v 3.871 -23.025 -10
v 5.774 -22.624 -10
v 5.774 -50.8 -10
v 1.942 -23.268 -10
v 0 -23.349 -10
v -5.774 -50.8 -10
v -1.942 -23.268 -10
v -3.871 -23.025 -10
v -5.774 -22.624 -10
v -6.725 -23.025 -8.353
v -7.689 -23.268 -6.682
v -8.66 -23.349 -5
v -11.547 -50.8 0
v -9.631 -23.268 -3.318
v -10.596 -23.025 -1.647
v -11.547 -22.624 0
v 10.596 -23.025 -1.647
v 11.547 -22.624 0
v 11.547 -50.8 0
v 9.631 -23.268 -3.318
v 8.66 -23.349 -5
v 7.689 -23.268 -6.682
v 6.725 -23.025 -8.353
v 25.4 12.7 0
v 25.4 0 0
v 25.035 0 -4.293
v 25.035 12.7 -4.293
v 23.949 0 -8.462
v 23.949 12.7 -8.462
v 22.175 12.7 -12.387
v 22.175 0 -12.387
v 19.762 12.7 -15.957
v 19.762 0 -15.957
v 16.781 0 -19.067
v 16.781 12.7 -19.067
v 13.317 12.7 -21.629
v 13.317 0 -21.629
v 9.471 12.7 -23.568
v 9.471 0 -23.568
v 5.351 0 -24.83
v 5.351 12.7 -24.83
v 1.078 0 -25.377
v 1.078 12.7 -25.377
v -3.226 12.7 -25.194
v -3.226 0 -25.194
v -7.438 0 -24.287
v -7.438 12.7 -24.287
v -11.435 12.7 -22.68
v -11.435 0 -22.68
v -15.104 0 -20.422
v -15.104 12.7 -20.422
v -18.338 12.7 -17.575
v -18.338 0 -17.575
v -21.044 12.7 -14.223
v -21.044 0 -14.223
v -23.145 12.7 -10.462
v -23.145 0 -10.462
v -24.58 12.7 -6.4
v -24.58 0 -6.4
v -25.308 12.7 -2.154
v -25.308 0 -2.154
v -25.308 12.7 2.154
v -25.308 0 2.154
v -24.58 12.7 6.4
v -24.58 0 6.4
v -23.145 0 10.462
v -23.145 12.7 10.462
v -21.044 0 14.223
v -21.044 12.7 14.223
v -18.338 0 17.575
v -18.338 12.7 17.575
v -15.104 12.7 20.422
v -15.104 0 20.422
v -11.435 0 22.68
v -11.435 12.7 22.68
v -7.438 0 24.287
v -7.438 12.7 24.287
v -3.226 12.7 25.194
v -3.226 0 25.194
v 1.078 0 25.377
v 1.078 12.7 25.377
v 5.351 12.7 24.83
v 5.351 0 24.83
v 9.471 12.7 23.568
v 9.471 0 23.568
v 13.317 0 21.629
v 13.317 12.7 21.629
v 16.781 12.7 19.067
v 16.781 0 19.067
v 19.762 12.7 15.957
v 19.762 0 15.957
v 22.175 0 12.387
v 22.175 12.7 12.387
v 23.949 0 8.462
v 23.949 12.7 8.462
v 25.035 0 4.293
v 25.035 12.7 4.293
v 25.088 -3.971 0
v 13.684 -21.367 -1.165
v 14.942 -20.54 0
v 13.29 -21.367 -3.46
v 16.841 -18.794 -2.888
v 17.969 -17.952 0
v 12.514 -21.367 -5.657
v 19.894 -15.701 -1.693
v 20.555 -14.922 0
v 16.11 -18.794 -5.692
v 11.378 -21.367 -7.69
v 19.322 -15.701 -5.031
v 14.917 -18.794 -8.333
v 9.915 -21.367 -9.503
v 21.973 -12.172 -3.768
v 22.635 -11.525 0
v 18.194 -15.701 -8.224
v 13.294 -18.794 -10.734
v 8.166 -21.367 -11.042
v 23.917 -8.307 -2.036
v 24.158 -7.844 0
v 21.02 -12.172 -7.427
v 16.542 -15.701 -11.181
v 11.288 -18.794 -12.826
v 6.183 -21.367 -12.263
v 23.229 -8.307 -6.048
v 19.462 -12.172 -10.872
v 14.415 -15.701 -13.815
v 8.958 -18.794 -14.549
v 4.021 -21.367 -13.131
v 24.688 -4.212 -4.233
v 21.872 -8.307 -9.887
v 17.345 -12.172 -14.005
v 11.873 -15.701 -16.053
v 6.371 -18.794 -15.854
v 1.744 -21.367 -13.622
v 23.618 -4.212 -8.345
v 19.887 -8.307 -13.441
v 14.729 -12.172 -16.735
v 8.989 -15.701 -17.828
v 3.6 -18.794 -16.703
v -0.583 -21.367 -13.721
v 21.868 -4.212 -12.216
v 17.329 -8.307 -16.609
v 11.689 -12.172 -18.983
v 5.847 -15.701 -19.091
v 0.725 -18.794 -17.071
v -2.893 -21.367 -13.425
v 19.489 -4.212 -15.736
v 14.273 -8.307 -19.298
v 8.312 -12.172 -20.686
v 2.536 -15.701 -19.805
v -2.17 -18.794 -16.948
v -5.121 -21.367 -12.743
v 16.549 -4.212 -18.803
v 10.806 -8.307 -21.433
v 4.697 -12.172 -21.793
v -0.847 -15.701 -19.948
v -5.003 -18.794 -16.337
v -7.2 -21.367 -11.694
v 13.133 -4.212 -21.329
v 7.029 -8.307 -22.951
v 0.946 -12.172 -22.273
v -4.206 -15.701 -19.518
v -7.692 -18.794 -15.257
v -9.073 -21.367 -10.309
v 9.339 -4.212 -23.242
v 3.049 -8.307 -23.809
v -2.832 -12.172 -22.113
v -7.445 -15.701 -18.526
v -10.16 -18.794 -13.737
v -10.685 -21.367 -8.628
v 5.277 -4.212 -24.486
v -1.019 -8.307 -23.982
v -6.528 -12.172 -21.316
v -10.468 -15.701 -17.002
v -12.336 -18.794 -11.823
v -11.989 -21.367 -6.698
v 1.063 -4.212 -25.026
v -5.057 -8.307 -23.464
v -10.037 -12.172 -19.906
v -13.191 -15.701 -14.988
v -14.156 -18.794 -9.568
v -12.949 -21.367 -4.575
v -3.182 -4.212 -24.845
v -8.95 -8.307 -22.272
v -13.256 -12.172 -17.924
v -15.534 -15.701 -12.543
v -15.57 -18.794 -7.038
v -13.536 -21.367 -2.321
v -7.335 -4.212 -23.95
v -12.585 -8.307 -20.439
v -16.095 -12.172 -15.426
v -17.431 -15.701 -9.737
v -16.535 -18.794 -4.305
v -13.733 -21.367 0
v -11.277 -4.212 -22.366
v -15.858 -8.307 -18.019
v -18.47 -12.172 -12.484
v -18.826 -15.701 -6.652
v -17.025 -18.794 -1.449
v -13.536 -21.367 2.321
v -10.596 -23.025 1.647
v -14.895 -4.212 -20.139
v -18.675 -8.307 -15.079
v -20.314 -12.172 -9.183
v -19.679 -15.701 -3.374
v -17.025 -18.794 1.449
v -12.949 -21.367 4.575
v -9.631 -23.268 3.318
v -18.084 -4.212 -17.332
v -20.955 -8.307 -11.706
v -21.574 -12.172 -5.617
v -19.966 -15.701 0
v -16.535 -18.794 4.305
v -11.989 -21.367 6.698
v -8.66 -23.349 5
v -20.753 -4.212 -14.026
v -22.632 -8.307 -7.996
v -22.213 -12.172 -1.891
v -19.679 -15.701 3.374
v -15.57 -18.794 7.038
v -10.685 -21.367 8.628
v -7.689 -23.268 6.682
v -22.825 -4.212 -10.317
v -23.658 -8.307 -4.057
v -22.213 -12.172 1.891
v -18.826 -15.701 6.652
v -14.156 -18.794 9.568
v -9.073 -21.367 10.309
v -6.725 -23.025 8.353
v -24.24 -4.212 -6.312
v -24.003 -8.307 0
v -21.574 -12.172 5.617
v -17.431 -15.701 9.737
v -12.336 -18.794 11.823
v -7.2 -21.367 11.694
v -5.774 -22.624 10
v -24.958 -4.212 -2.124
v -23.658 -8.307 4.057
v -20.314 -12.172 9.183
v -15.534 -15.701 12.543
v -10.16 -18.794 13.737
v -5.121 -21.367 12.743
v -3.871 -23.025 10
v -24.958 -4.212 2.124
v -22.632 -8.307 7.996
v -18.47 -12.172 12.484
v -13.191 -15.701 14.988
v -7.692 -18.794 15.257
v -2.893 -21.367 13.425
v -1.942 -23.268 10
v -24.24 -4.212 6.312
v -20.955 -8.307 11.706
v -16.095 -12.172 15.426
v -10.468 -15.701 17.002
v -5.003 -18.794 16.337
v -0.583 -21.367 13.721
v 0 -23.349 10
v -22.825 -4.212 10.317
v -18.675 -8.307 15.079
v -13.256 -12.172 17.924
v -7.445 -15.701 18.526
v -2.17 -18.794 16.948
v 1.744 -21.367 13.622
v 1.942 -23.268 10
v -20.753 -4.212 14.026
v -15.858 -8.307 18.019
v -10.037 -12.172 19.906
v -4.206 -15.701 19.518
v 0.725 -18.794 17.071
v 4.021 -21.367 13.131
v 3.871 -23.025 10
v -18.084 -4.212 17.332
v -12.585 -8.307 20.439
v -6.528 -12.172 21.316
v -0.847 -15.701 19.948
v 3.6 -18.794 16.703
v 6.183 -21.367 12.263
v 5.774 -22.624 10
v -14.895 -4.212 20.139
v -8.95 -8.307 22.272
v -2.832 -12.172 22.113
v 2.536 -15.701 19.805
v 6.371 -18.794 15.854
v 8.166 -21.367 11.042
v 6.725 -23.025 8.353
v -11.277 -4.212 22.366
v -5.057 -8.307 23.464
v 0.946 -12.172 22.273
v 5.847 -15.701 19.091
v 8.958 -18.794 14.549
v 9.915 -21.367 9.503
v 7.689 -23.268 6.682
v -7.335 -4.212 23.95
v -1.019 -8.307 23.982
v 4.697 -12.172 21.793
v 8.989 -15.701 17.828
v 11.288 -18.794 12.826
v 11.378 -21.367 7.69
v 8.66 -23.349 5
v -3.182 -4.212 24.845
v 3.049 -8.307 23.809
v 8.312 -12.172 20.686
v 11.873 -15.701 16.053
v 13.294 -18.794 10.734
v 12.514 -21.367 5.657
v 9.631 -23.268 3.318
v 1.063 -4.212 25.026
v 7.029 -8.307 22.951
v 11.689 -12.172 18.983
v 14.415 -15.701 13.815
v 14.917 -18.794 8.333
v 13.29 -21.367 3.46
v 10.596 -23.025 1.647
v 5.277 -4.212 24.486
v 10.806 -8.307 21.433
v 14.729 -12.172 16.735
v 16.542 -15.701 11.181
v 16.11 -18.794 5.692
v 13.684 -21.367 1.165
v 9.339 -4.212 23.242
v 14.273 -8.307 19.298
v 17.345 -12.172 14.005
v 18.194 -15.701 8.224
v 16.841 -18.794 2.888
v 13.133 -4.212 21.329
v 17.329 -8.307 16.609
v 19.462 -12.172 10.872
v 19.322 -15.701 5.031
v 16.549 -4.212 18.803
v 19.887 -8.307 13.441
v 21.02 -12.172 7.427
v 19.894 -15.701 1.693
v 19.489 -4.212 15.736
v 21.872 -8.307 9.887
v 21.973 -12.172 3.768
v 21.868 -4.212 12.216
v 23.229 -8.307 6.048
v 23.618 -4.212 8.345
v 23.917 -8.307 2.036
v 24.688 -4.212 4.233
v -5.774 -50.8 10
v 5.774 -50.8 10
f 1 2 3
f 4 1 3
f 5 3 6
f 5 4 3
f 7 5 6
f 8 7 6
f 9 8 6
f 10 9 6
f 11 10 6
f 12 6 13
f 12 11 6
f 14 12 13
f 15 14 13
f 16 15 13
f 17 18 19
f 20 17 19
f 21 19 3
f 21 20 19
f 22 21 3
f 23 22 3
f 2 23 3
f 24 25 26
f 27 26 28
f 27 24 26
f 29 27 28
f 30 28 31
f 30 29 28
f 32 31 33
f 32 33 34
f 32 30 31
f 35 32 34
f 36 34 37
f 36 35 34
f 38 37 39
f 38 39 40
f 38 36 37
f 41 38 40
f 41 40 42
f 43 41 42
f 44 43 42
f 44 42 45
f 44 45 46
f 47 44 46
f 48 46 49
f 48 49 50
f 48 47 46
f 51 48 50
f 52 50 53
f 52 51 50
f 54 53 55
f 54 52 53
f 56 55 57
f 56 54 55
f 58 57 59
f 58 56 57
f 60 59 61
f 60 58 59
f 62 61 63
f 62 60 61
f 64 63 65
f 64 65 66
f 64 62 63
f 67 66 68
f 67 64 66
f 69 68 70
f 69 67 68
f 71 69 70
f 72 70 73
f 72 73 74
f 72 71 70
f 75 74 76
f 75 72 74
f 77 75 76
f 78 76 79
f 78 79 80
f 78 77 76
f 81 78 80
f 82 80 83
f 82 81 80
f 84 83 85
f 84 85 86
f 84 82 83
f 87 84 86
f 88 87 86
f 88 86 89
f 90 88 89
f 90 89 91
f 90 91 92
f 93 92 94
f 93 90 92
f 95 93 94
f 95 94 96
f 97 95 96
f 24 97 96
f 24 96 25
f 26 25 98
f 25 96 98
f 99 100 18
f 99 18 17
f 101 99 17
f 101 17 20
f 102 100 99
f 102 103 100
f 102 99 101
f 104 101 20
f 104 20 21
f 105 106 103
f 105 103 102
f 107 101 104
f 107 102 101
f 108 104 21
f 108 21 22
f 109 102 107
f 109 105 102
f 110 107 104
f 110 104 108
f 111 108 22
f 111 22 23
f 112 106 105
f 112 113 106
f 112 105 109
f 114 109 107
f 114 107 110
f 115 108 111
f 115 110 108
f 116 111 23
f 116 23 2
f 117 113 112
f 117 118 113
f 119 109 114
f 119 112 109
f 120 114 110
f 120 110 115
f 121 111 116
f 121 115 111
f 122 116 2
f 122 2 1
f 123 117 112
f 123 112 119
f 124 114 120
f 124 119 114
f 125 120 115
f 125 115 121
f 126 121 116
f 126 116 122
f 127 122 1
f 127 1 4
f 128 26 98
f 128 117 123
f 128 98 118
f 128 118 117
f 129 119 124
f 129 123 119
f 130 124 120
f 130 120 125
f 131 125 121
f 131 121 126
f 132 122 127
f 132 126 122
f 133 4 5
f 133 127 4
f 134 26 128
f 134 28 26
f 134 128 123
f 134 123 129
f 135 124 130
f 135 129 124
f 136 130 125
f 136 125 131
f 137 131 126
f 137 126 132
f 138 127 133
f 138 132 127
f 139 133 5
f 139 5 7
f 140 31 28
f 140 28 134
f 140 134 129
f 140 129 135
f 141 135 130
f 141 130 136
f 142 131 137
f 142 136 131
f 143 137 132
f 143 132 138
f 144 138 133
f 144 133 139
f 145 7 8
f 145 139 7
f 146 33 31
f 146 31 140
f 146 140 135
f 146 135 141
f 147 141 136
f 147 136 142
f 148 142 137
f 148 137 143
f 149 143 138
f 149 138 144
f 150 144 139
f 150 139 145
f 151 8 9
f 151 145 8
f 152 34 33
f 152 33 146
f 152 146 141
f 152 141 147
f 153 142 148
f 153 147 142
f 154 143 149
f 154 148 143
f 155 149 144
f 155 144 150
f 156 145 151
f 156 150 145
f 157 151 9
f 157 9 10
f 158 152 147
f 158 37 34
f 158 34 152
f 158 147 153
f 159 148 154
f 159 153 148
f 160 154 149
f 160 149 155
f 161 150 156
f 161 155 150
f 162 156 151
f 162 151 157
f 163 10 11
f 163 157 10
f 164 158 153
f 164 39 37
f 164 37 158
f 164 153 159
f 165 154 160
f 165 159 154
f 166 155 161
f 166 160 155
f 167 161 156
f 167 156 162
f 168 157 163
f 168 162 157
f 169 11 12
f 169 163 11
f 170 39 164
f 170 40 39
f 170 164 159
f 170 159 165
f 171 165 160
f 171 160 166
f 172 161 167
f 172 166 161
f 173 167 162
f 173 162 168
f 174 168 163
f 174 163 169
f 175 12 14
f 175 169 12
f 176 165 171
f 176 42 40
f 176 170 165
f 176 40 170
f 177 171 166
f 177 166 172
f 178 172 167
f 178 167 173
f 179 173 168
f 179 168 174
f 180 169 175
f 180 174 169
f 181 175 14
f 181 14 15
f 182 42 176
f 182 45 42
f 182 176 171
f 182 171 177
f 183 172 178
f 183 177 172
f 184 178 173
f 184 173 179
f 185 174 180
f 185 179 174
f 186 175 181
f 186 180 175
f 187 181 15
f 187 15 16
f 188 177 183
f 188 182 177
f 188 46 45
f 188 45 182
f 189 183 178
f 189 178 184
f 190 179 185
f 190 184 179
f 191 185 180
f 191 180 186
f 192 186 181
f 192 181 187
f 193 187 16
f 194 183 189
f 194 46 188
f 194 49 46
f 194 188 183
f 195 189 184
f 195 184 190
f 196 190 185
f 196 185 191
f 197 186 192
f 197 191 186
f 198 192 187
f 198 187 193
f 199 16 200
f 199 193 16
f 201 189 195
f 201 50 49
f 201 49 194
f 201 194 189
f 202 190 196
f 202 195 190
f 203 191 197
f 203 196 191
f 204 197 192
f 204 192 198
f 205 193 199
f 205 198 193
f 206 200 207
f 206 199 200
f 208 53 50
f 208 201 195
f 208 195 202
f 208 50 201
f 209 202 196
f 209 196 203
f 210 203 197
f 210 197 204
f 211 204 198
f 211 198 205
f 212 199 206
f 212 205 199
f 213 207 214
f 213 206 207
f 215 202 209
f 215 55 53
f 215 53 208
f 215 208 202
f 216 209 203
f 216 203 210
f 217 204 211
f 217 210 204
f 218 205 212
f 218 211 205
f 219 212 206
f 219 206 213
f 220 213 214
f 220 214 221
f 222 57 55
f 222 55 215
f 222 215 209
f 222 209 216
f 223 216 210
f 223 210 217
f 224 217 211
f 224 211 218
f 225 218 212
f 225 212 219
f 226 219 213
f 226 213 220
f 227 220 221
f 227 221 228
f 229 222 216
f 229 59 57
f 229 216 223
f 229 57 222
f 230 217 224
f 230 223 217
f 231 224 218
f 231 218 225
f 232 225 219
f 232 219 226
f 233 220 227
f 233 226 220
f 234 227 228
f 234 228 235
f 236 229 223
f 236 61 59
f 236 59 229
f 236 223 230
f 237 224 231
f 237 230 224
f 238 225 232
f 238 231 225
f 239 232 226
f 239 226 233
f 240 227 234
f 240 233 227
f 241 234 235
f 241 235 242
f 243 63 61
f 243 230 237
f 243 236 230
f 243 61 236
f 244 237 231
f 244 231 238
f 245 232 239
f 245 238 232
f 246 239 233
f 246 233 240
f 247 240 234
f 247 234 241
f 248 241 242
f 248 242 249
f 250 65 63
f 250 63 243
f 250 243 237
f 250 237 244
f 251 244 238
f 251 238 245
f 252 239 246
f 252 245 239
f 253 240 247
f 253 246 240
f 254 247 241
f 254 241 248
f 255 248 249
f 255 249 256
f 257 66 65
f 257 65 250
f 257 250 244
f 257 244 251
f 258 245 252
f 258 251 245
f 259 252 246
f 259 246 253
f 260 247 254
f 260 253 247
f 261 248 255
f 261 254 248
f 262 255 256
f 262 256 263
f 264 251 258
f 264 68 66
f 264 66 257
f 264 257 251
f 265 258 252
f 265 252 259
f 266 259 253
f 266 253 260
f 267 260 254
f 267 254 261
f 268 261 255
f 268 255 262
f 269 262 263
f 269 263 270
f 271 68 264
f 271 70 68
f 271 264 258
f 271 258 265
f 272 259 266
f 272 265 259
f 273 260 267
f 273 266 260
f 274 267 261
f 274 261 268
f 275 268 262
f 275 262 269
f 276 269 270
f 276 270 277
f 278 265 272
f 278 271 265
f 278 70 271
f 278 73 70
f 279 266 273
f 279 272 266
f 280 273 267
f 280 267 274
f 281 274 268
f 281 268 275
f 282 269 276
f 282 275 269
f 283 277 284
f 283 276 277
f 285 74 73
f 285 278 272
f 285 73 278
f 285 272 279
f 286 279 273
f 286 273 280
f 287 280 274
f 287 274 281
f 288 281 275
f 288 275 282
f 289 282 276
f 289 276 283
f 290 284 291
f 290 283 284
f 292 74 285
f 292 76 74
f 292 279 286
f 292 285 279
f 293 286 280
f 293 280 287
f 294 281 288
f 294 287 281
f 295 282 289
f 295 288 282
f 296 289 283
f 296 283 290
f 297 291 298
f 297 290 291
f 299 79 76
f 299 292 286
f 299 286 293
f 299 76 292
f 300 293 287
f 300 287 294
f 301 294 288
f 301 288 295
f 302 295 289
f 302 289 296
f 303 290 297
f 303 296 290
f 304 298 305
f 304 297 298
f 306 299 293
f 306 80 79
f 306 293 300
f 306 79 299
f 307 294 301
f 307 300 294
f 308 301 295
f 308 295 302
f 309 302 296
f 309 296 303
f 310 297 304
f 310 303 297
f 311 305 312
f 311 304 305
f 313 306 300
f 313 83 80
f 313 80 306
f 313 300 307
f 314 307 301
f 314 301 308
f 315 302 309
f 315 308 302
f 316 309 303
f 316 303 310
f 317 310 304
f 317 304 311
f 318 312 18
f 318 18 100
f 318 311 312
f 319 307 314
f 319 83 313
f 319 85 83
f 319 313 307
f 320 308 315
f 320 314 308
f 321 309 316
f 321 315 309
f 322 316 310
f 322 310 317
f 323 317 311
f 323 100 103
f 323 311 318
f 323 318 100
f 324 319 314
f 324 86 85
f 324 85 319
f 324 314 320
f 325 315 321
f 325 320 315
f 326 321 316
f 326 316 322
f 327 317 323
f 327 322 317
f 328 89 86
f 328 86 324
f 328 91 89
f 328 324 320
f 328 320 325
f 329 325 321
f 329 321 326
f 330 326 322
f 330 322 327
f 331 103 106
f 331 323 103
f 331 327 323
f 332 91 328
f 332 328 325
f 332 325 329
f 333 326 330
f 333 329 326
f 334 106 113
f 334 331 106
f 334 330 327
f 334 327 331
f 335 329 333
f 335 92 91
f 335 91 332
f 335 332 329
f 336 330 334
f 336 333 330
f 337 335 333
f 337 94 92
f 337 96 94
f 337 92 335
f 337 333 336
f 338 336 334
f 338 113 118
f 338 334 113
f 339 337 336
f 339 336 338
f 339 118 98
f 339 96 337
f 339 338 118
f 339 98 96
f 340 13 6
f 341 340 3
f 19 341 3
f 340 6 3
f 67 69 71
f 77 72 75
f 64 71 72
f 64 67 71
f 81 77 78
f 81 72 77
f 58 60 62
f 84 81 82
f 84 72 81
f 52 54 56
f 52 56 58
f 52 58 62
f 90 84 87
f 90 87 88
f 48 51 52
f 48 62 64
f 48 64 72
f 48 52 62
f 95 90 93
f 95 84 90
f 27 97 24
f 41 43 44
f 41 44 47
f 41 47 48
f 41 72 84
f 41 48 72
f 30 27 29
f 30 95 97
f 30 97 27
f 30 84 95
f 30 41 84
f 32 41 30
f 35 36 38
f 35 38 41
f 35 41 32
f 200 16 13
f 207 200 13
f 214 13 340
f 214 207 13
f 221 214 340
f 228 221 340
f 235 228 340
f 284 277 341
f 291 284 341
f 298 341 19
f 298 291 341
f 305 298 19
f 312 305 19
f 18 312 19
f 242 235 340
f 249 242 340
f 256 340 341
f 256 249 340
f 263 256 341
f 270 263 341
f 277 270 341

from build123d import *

# Parameters (mm, degrees)
BOSS_EXTRUDE1_DEPTH = 50.8


with BuildPart() as part:
    # Sketch2 → Revolve3 (revolve)
    with BuildSketch(Plane.XY):
        with BuildLine():
            Line((0, 12.7), (0, -25.4))
            ThreePointArc((0, -25.4), (17.960512242, -17.960512242), (25.4, 0))
            Line((25.4, 0), (25.4, 12.7))
            Line((25.4, 12.7), (0, 12.7))
        make_face()
    revolve(axis=Axis((0, -50, 0), (0, 1, 0)))

    # Sketch3 → Boss-Extrude1 (add)
    with BuildSketch(Plane(origin=(0, 0, 0), x_dir=(1, 0, 0), z_dir=(0, 1, 0))):
        Polygon((-5.773502692, -10), (5.773502692, -10), (11.547005384, 0), (5.773502692, 10), (-5.773502692, 10), (-11.547005384, 0), align=None)
    extrude(amount=-BOSS_EXTRUDE1_DEPTH)


solid = part.part
